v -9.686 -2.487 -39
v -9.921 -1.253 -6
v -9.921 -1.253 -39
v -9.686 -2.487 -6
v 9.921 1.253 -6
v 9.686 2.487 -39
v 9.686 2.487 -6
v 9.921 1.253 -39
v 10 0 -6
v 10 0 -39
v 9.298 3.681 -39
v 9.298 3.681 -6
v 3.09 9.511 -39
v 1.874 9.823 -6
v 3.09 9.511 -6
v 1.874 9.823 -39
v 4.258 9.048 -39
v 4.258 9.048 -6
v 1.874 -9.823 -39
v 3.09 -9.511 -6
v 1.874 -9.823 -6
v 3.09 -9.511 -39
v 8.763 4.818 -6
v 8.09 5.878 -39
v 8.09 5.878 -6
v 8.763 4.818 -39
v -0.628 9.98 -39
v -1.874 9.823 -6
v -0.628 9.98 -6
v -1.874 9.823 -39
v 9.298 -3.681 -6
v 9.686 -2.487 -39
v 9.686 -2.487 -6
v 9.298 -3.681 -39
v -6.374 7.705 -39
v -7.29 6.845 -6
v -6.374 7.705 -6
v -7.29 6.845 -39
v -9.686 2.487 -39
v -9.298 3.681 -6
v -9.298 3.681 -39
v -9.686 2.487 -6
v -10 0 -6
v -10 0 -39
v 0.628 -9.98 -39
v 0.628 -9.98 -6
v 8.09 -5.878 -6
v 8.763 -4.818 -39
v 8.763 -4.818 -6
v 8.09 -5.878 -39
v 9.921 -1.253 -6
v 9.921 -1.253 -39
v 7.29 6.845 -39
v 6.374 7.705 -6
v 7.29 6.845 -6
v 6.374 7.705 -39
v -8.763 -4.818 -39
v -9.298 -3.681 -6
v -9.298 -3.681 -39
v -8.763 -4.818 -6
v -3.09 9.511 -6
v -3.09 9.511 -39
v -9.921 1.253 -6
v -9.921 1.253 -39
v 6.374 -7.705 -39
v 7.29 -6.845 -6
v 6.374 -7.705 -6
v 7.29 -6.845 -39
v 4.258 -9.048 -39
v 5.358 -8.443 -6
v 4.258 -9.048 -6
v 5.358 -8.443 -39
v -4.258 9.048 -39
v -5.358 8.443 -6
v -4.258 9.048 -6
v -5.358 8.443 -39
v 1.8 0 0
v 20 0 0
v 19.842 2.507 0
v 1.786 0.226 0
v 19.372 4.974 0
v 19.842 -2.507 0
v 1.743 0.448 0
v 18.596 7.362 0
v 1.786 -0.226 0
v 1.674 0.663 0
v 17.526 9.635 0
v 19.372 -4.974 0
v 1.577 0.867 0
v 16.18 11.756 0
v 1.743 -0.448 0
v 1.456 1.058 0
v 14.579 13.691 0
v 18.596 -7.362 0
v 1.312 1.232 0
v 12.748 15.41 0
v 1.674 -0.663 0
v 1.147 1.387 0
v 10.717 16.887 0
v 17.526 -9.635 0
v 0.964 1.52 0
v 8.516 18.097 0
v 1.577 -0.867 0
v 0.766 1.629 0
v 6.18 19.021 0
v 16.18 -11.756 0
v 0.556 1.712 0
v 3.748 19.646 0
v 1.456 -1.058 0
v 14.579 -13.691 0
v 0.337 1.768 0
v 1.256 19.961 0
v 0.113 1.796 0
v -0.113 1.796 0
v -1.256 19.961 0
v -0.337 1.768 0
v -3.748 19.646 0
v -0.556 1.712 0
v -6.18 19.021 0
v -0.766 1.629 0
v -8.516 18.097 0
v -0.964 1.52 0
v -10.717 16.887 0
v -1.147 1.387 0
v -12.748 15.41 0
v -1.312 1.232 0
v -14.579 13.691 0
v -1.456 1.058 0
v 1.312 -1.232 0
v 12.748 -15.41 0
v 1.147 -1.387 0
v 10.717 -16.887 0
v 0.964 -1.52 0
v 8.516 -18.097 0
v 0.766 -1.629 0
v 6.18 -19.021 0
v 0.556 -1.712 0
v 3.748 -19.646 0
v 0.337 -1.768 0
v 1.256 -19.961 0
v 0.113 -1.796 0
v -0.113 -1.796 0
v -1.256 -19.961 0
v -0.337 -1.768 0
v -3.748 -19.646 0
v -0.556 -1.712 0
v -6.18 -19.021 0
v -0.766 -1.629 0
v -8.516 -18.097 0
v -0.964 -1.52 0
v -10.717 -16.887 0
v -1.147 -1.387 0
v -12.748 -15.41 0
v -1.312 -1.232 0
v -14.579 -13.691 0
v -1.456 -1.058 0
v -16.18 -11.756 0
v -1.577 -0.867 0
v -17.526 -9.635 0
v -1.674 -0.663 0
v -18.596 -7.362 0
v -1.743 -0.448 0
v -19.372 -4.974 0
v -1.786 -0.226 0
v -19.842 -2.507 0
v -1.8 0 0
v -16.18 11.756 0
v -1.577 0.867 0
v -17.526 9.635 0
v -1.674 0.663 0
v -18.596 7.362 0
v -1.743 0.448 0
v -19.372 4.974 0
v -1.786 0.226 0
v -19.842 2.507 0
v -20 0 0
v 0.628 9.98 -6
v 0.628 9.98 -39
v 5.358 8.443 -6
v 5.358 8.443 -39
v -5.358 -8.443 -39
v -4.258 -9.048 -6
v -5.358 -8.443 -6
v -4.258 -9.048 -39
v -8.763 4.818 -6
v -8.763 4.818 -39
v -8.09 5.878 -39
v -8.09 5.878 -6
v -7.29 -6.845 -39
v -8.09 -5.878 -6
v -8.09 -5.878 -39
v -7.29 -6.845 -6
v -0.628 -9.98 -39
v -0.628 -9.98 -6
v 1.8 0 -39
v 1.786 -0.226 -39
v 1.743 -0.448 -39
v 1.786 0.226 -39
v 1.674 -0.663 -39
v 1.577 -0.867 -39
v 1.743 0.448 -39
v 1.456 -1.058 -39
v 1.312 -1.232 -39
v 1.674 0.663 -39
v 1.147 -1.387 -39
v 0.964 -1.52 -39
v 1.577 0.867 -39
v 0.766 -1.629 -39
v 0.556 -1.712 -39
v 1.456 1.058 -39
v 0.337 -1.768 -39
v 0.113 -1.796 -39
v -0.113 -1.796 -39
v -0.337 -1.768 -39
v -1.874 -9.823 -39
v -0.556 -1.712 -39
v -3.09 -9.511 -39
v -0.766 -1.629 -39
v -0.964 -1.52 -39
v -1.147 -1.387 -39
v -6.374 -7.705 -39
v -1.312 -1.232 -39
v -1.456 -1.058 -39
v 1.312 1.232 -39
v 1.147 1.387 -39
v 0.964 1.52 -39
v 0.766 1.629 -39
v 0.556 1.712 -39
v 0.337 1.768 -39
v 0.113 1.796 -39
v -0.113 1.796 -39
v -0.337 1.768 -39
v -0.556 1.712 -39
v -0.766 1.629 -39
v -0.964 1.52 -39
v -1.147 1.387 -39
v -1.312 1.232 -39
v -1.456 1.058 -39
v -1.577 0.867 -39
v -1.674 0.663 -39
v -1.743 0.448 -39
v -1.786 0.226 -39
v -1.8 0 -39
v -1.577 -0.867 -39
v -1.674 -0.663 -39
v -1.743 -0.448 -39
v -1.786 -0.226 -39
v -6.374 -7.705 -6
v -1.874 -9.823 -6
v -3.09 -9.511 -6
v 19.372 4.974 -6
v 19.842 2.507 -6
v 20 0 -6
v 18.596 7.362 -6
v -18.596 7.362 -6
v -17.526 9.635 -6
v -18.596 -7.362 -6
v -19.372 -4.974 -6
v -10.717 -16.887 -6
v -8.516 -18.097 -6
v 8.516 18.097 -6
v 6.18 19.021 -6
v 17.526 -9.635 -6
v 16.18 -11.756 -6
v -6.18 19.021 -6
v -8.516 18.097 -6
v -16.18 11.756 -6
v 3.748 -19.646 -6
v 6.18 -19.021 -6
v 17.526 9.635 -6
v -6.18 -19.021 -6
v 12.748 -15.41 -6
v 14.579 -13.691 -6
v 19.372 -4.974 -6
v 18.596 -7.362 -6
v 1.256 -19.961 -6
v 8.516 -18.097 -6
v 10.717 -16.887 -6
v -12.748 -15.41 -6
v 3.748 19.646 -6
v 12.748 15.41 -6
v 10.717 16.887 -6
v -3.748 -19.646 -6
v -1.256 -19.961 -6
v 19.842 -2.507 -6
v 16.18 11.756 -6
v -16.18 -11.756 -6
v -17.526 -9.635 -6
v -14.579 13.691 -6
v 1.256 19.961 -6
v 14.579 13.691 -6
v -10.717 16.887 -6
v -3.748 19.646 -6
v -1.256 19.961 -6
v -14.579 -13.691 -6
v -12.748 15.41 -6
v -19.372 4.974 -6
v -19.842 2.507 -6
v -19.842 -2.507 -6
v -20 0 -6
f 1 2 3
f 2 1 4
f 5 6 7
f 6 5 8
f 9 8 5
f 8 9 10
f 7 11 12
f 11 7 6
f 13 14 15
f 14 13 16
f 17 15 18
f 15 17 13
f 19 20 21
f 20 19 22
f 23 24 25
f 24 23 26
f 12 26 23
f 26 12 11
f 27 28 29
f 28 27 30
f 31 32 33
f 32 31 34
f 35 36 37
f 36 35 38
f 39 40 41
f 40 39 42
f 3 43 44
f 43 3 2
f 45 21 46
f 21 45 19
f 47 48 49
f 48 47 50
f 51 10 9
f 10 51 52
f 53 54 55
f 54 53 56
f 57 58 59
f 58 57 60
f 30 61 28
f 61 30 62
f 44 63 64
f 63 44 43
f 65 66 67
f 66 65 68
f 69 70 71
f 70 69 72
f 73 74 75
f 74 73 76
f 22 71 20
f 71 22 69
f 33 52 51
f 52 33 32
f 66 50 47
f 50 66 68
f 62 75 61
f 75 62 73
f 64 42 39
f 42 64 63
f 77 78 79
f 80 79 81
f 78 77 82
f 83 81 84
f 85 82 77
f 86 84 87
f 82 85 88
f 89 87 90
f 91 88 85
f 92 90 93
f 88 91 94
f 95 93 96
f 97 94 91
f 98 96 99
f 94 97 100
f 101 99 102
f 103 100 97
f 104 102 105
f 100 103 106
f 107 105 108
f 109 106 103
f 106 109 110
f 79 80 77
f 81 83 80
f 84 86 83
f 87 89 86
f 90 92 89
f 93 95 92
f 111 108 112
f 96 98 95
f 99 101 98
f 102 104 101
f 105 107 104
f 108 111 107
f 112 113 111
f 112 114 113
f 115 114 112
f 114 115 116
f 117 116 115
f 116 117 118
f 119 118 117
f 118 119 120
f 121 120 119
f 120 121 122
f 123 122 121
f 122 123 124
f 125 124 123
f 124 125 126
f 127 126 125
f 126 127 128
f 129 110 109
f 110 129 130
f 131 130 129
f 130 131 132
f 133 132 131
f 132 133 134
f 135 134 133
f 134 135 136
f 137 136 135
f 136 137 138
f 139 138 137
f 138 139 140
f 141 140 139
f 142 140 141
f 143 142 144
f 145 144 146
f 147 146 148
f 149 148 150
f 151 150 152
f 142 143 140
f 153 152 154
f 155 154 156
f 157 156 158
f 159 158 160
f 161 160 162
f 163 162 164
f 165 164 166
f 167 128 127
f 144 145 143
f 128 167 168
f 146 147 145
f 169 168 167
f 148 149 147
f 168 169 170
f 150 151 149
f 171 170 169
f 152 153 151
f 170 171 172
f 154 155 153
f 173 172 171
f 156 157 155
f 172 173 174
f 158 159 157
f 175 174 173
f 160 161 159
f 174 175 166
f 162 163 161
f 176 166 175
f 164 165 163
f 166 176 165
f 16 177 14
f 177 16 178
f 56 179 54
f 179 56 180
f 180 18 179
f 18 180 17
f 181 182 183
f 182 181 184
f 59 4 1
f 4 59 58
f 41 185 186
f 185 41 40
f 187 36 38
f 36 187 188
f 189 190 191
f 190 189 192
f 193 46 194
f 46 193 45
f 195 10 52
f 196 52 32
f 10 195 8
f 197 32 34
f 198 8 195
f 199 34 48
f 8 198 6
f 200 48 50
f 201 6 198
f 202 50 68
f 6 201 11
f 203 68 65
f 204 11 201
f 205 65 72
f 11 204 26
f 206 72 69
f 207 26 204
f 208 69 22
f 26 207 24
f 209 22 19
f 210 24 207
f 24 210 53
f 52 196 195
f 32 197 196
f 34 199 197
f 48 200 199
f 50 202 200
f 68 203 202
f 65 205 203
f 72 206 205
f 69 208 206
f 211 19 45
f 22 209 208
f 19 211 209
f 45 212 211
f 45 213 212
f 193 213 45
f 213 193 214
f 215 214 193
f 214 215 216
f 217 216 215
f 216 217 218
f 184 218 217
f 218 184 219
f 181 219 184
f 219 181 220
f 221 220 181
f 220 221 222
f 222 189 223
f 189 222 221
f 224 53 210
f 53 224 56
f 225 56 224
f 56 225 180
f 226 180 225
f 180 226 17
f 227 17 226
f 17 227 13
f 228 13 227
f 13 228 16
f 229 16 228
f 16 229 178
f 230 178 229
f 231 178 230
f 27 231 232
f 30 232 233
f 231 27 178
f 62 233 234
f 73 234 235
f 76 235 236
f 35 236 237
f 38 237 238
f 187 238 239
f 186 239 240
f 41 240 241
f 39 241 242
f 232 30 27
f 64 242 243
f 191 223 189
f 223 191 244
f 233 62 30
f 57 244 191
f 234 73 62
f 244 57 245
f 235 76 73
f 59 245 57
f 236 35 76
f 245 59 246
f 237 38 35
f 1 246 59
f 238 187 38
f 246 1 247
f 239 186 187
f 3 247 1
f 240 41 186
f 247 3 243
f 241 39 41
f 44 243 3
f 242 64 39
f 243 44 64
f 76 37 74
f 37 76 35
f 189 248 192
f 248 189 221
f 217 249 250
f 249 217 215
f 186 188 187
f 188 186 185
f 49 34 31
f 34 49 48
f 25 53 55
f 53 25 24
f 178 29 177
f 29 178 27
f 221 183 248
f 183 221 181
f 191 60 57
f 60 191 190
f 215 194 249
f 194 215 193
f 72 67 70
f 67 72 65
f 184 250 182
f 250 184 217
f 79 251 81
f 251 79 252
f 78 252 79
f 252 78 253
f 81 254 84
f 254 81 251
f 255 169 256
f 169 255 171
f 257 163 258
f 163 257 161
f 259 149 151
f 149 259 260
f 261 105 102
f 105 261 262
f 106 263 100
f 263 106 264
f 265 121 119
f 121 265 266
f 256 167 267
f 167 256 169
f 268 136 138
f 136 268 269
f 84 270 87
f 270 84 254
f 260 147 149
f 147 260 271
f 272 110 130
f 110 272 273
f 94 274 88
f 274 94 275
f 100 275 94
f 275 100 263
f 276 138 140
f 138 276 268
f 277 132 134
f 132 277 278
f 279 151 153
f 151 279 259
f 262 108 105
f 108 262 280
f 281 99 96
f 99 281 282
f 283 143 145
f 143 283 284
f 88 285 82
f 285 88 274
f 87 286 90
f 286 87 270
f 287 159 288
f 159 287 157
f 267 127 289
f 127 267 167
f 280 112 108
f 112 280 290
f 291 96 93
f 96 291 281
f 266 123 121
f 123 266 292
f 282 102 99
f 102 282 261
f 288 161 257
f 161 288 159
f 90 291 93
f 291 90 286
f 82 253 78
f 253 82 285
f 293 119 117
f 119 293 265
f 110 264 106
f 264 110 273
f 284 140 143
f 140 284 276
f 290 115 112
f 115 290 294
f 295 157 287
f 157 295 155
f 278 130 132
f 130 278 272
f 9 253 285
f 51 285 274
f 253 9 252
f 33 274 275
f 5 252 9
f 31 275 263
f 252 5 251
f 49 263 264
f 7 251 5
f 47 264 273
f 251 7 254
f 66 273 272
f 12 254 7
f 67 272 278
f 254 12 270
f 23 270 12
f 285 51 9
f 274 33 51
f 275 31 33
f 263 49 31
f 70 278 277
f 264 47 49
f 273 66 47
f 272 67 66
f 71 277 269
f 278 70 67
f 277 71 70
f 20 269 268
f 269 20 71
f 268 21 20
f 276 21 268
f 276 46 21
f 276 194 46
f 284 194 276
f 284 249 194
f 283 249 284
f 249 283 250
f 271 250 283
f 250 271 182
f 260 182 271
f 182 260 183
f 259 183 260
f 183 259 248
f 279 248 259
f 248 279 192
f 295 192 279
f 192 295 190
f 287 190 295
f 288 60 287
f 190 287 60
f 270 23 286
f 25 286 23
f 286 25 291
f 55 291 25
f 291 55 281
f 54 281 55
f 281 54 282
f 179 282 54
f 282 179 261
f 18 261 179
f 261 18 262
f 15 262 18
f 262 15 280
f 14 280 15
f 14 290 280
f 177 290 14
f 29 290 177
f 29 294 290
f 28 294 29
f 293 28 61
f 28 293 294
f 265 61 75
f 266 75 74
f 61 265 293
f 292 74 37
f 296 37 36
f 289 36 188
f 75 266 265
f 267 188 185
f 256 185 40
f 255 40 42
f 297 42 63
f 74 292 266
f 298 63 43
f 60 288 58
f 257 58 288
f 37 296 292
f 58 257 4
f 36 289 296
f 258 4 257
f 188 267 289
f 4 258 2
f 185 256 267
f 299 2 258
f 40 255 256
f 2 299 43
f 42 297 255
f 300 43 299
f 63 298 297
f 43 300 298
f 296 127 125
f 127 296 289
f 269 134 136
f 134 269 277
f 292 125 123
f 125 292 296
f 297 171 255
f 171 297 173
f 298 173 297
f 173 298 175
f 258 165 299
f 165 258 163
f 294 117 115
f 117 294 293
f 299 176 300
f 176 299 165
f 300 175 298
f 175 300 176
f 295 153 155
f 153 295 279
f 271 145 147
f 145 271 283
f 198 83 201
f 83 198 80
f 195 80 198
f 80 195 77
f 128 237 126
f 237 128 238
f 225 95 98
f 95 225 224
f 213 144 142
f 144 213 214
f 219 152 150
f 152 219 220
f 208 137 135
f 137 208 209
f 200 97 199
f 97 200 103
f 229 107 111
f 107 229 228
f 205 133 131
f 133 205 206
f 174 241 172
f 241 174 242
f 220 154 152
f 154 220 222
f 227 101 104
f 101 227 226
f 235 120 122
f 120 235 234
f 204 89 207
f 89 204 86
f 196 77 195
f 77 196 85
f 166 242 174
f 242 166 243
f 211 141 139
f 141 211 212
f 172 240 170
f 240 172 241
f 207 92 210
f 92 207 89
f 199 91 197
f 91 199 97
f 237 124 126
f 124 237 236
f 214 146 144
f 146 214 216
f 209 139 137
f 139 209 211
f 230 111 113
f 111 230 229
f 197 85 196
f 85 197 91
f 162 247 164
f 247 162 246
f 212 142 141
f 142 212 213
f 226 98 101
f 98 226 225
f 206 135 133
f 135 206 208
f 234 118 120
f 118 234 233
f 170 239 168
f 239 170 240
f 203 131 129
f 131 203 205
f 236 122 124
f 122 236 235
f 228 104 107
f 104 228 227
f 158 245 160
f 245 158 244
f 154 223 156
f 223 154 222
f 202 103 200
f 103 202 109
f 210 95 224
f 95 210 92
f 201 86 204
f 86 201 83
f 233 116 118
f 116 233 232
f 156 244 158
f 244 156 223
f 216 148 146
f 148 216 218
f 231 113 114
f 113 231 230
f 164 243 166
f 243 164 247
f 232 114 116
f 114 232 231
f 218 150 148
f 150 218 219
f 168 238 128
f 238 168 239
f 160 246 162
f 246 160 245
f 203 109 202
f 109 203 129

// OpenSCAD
$fn = 50;


difference() {
	union() {
		translate(v = [0, 0, -39.0000000000]) {
			cylinder(h = 39, r = 10.0000000000);
		}
		translate(v = [0, 0, -6.0000000000]) {
			cylinder(h = 6, r = 20.0000000000);
		}
	}
	union() {
		#translate(v = [0, 0, -39]) {
			cylinder(h = 39, r = 1.8000000000);
		}
	}
}
